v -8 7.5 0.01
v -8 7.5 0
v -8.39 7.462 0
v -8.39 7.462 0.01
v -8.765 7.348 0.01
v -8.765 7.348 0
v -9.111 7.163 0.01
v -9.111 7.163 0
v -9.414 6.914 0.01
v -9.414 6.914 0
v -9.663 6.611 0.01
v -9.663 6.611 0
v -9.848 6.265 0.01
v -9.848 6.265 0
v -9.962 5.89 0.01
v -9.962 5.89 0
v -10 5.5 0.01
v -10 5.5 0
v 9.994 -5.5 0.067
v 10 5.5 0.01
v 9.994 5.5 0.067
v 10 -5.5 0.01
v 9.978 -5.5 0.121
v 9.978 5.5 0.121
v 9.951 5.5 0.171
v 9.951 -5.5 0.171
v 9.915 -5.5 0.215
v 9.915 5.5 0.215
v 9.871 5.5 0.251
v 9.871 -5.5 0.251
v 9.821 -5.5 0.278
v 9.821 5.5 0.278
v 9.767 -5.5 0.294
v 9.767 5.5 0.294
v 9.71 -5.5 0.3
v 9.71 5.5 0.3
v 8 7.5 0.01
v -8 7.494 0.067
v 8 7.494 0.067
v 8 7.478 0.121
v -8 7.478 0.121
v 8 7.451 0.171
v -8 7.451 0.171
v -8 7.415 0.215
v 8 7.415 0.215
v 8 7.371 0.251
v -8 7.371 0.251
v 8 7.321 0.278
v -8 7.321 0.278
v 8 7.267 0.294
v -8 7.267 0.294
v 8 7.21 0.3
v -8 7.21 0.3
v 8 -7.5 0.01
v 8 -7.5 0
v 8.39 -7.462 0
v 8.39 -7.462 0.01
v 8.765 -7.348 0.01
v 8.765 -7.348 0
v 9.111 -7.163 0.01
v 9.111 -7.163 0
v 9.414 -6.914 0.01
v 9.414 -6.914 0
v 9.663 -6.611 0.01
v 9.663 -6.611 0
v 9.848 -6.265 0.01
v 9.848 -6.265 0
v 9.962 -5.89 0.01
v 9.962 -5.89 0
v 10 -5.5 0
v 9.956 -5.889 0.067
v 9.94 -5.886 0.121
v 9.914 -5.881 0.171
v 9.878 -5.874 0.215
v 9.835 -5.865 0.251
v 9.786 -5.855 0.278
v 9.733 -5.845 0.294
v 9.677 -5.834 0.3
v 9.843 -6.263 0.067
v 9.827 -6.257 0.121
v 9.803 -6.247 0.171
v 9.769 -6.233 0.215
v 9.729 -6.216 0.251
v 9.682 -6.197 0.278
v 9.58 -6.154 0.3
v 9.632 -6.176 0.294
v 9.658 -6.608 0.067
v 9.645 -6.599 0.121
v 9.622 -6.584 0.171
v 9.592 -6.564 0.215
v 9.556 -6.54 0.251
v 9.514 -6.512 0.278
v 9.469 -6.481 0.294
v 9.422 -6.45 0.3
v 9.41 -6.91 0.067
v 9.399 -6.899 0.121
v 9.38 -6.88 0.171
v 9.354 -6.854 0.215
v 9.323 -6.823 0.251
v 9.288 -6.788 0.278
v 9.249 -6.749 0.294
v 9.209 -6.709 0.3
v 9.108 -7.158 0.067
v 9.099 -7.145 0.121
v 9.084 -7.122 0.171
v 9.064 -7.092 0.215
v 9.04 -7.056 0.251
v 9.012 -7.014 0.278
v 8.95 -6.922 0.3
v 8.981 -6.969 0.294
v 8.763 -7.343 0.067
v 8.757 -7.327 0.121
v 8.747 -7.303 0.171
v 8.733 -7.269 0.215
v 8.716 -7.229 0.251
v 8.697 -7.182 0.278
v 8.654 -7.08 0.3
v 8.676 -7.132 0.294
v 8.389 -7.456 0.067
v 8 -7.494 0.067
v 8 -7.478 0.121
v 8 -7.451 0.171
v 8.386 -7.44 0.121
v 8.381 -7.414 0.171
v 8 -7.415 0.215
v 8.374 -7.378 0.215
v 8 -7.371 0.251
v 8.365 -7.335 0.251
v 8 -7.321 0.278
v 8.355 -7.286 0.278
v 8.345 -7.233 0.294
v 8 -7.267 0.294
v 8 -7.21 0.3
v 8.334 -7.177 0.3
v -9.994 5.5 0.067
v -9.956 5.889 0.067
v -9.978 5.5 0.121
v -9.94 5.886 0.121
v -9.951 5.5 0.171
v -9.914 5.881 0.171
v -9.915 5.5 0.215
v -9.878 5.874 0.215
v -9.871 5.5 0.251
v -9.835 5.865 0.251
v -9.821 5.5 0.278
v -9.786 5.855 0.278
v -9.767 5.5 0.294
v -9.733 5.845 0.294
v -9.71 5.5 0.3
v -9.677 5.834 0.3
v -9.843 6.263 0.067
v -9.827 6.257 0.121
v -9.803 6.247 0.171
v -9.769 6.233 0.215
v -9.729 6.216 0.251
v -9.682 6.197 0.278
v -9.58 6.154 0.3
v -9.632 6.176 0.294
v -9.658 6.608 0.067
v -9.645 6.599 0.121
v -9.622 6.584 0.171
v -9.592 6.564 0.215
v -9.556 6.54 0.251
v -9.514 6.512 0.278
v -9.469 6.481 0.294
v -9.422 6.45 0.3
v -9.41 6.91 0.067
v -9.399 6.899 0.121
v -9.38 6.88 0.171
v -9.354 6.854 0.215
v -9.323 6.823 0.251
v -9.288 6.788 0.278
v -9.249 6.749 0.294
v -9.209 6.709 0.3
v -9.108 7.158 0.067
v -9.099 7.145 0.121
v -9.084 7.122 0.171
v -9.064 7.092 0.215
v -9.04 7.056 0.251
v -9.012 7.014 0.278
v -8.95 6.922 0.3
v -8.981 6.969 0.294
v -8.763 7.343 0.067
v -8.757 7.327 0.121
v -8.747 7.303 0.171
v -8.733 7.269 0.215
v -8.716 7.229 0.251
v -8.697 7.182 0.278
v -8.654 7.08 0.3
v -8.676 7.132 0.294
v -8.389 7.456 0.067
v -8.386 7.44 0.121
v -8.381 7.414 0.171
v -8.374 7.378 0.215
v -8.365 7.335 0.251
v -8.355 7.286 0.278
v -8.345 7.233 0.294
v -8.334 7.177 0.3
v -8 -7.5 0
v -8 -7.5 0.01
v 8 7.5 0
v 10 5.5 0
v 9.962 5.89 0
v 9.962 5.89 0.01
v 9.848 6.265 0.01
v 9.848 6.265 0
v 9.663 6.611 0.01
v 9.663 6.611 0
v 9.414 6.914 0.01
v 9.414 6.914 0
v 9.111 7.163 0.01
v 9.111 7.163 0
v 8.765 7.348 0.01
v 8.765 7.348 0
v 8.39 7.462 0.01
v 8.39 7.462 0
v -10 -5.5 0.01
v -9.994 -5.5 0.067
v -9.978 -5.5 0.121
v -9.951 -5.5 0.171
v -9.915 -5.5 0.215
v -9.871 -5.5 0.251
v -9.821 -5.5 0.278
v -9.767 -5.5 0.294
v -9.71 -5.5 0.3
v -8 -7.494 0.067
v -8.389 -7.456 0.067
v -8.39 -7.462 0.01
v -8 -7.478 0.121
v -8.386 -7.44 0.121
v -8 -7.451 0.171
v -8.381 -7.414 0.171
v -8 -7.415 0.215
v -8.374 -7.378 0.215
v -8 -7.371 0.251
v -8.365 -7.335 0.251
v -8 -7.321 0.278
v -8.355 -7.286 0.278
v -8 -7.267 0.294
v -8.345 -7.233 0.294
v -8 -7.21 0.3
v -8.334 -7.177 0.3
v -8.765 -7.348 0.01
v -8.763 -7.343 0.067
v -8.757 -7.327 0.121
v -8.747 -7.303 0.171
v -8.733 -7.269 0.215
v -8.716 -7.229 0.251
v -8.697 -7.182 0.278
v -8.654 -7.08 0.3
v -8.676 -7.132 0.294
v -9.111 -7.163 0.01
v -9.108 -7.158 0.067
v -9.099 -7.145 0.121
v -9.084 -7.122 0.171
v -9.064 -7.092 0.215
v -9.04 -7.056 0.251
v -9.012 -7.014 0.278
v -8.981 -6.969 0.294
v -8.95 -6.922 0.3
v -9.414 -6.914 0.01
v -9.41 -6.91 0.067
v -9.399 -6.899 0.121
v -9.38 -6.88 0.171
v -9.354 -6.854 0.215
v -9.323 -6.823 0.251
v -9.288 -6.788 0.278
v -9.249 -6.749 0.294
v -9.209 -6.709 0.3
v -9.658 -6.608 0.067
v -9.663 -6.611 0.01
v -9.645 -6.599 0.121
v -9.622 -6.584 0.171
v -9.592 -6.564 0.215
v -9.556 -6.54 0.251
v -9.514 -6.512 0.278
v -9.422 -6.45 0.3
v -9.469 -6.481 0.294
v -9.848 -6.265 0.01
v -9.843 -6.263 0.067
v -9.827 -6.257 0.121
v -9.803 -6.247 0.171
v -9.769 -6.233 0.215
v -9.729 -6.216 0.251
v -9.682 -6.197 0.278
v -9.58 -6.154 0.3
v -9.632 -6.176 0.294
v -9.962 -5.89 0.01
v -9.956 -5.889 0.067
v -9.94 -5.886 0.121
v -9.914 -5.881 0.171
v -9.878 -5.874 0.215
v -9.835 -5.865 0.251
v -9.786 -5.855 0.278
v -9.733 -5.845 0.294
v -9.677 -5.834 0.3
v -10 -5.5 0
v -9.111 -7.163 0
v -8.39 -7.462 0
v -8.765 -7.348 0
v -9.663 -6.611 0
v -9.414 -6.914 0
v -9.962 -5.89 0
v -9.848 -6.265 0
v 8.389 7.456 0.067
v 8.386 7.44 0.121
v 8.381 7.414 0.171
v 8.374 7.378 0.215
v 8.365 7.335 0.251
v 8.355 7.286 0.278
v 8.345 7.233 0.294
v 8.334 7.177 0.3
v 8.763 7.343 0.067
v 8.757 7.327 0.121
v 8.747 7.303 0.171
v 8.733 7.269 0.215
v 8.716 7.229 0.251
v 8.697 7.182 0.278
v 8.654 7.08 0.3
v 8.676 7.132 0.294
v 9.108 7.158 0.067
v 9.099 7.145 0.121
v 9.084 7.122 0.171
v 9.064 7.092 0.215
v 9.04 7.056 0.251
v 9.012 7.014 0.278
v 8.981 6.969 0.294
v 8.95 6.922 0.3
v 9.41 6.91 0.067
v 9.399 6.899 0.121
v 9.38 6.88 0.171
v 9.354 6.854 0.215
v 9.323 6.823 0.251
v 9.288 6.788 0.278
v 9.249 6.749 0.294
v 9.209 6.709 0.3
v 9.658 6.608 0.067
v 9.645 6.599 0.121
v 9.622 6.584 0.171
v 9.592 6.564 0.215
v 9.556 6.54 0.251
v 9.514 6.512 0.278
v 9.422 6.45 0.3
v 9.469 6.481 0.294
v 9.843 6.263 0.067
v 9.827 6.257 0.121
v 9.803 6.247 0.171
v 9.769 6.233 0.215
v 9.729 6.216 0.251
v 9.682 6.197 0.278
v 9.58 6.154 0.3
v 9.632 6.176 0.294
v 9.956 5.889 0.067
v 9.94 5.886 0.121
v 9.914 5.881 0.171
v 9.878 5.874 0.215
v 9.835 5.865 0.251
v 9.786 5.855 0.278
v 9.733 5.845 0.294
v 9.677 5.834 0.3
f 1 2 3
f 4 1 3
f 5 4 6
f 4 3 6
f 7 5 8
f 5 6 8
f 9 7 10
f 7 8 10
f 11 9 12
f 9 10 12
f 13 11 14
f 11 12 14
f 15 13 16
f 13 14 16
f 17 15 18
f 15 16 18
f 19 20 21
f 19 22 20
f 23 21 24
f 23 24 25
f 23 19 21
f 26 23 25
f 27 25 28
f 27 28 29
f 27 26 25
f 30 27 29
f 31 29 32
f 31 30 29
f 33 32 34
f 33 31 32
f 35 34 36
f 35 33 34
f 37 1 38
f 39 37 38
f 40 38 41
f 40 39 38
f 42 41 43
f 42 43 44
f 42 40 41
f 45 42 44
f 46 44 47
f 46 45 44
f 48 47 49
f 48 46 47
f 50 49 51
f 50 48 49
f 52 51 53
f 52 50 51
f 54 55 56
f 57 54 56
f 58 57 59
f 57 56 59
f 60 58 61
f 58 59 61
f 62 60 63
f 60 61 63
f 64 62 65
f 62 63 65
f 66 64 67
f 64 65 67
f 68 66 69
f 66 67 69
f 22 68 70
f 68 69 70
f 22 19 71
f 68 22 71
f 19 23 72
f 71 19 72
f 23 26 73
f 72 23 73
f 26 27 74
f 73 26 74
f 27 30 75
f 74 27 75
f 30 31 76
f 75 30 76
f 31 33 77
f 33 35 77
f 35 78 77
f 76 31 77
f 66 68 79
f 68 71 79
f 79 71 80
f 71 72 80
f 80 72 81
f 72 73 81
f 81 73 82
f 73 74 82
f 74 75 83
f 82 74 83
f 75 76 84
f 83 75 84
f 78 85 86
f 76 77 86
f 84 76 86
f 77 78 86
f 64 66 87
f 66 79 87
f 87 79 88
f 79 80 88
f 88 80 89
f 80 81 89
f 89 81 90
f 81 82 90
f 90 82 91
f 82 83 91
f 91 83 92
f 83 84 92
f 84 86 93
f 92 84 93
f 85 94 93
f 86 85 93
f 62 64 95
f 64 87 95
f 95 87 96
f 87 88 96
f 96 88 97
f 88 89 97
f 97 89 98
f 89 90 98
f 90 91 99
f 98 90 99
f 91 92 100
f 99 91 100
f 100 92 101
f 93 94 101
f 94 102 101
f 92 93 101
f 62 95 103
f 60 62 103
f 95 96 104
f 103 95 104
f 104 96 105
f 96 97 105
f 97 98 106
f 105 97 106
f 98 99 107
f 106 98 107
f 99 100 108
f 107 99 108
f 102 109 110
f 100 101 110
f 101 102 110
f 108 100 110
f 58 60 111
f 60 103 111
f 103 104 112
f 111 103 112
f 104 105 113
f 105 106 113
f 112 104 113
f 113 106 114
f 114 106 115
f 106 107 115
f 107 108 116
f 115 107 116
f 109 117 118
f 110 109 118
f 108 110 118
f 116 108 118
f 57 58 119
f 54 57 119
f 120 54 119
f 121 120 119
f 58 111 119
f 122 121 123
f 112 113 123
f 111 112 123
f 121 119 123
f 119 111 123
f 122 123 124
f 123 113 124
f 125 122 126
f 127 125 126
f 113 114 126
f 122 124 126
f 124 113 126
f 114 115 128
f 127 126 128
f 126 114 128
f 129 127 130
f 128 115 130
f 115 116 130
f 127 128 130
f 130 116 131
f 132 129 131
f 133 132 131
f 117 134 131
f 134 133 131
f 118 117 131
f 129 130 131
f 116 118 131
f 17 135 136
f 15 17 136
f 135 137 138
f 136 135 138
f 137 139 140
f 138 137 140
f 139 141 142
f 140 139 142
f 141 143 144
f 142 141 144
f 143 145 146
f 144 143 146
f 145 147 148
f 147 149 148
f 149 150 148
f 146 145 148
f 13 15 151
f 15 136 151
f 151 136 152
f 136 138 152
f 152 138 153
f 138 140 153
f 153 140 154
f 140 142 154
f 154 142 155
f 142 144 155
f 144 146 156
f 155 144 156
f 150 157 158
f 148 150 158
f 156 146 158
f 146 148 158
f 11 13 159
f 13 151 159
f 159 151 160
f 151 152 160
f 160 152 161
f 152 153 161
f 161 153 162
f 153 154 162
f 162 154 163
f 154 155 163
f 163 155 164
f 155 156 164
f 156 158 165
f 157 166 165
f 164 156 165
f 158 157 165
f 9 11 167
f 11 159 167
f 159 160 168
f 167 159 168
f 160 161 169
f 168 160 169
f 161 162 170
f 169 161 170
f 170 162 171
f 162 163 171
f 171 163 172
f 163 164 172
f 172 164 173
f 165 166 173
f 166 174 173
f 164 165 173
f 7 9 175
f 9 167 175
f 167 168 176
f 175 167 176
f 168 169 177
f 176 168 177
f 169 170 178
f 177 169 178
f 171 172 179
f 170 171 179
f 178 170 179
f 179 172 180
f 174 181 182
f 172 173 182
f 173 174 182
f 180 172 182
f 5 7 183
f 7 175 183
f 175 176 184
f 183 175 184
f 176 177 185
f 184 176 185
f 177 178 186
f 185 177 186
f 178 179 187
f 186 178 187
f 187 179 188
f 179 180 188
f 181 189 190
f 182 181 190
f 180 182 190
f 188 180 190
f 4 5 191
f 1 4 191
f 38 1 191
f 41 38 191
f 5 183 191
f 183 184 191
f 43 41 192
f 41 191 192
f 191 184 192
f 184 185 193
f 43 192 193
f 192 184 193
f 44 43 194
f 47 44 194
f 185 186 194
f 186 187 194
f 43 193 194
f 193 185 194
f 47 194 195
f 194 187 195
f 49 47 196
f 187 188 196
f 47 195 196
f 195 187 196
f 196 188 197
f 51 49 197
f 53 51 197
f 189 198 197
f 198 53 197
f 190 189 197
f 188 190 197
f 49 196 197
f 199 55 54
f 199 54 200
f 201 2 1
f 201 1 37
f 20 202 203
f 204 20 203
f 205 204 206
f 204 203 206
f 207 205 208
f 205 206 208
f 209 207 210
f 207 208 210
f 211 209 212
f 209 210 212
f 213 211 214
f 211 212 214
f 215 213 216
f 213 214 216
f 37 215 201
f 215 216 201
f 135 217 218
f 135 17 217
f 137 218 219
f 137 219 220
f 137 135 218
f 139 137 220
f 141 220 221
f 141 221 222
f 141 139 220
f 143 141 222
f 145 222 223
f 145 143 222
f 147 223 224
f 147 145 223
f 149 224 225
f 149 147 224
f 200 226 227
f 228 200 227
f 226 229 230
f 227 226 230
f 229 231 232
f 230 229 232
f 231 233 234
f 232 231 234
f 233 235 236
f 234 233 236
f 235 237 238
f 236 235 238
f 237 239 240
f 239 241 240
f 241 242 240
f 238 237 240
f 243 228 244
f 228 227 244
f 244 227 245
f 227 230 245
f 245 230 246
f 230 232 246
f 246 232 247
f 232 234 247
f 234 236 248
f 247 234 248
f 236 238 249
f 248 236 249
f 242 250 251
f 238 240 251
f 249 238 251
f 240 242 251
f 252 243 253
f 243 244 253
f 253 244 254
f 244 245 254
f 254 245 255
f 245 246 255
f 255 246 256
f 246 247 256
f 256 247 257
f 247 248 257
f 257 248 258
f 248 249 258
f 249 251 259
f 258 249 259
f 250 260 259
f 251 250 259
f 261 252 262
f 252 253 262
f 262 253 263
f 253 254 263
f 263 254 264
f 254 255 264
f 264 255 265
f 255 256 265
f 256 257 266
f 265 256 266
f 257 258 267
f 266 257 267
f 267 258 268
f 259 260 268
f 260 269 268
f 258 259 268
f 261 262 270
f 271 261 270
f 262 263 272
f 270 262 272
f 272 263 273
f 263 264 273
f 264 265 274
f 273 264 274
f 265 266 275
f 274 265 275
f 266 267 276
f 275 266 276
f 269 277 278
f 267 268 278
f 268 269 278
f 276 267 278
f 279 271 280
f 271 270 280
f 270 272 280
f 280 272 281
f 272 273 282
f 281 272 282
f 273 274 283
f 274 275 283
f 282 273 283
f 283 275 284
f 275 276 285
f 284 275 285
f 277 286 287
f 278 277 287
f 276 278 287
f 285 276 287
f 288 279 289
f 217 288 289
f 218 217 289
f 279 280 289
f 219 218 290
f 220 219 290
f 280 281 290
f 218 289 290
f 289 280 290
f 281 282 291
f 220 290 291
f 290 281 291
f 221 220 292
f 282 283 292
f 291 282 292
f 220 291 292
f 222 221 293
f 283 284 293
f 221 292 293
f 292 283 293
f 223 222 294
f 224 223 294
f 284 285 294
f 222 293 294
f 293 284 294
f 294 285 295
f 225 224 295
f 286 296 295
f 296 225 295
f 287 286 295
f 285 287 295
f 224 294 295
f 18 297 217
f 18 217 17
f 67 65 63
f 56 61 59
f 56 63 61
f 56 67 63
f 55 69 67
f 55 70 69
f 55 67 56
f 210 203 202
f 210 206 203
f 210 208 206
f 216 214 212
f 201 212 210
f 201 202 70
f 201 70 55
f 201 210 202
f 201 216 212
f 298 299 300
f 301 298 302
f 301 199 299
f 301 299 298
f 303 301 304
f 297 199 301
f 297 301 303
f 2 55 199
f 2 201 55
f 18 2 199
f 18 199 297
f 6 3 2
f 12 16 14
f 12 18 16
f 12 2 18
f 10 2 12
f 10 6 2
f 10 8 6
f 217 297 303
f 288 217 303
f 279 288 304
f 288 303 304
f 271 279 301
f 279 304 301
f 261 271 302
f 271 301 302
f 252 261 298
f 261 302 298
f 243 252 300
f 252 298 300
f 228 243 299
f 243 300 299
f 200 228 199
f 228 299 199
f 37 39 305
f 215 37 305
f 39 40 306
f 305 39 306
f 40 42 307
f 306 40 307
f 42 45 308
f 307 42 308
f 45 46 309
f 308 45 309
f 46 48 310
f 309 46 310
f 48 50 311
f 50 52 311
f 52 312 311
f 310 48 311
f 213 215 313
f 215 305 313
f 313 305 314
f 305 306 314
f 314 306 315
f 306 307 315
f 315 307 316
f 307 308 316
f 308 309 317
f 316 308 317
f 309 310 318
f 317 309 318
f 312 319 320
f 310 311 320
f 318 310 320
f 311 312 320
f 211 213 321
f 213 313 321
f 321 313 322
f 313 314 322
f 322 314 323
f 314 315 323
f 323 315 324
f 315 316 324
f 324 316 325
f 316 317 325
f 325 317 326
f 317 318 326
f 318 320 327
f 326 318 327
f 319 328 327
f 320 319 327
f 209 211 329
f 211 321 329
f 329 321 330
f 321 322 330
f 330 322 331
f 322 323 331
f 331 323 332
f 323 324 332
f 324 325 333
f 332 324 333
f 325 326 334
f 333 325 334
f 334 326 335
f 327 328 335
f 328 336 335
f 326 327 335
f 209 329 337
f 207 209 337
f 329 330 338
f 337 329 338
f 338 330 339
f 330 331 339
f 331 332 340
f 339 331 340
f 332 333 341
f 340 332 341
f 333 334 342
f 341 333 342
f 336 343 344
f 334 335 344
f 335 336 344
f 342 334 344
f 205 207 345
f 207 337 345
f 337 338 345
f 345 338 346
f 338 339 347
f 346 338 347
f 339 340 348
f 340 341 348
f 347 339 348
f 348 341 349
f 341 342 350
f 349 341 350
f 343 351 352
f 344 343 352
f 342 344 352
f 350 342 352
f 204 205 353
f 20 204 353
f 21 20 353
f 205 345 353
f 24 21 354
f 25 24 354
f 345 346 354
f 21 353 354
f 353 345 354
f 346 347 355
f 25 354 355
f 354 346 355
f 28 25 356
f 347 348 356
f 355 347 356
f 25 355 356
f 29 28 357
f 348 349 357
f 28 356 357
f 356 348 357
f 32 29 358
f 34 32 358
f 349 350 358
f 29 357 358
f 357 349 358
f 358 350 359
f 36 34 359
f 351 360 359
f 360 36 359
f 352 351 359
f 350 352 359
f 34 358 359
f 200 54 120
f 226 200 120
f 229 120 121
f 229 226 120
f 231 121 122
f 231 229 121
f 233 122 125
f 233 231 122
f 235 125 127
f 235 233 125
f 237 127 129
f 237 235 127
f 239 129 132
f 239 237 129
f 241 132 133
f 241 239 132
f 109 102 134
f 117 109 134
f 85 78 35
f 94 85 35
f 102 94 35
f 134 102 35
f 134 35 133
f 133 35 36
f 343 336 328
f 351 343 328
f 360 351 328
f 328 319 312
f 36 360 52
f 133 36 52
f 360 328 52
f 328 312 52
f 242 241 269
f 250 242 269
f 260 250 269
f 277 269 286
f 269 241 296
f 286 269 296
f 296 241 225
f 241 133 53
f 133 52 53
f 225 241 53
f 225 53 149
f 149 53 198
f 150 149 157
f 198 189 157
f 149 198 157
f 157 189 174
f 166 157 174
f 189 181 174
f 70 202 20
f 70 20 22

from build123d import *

# Parameters (mm, degrees)
PAD_DEPTH = 0.3
FILLET_R  = 0.29


with BuildPart() as part:
    # Sketch → Pad (new body)
    with BuildSketch(Plane.XY):
        with BuildLine():
            Line((-8, 7.5), (8, 7.5))
            ThreePointArc((10, 5.5), (9.414214, 6.914214), (8, 7.5))
            Line((10, 5.5), (10, -5.5))
            ThreePointArc((8, -7.5), (9.414214, -6.914214), (10, -5.5))
            Line((8, -7.5), (-8, -7.5))
            ThreePointArc((-10, -5.5), (-9.414214, -6.914214), (-8, -7.5))
            Line((-10, -5.5), (-10, 5.5))
            ThreePointArc((-8, 7.5), (-9.414214, 6.914214), (-10, 5.5))
        make_face()
    extrude(amount=PAD_DEPTH)

    # Fillet
    fillet_edges = [part.edges().sort_by_distance(p)[0] for p in [
        (0, 7.5, 0.3),
        (-9.414214, 6.914214, 0.3),
        (-10, 0, 0.3),
        (-9.414214, -6.914214, 0.3),
        (0, -7.5, 0.3),
        (9.414214, -6.914214, 0.3),
        (10, 0, 0.3),
        (9.414214, 6.914214, 0.3),
    ]]
    fillet(fillet_edges, radius=FILLET_R)


solid = part.part
